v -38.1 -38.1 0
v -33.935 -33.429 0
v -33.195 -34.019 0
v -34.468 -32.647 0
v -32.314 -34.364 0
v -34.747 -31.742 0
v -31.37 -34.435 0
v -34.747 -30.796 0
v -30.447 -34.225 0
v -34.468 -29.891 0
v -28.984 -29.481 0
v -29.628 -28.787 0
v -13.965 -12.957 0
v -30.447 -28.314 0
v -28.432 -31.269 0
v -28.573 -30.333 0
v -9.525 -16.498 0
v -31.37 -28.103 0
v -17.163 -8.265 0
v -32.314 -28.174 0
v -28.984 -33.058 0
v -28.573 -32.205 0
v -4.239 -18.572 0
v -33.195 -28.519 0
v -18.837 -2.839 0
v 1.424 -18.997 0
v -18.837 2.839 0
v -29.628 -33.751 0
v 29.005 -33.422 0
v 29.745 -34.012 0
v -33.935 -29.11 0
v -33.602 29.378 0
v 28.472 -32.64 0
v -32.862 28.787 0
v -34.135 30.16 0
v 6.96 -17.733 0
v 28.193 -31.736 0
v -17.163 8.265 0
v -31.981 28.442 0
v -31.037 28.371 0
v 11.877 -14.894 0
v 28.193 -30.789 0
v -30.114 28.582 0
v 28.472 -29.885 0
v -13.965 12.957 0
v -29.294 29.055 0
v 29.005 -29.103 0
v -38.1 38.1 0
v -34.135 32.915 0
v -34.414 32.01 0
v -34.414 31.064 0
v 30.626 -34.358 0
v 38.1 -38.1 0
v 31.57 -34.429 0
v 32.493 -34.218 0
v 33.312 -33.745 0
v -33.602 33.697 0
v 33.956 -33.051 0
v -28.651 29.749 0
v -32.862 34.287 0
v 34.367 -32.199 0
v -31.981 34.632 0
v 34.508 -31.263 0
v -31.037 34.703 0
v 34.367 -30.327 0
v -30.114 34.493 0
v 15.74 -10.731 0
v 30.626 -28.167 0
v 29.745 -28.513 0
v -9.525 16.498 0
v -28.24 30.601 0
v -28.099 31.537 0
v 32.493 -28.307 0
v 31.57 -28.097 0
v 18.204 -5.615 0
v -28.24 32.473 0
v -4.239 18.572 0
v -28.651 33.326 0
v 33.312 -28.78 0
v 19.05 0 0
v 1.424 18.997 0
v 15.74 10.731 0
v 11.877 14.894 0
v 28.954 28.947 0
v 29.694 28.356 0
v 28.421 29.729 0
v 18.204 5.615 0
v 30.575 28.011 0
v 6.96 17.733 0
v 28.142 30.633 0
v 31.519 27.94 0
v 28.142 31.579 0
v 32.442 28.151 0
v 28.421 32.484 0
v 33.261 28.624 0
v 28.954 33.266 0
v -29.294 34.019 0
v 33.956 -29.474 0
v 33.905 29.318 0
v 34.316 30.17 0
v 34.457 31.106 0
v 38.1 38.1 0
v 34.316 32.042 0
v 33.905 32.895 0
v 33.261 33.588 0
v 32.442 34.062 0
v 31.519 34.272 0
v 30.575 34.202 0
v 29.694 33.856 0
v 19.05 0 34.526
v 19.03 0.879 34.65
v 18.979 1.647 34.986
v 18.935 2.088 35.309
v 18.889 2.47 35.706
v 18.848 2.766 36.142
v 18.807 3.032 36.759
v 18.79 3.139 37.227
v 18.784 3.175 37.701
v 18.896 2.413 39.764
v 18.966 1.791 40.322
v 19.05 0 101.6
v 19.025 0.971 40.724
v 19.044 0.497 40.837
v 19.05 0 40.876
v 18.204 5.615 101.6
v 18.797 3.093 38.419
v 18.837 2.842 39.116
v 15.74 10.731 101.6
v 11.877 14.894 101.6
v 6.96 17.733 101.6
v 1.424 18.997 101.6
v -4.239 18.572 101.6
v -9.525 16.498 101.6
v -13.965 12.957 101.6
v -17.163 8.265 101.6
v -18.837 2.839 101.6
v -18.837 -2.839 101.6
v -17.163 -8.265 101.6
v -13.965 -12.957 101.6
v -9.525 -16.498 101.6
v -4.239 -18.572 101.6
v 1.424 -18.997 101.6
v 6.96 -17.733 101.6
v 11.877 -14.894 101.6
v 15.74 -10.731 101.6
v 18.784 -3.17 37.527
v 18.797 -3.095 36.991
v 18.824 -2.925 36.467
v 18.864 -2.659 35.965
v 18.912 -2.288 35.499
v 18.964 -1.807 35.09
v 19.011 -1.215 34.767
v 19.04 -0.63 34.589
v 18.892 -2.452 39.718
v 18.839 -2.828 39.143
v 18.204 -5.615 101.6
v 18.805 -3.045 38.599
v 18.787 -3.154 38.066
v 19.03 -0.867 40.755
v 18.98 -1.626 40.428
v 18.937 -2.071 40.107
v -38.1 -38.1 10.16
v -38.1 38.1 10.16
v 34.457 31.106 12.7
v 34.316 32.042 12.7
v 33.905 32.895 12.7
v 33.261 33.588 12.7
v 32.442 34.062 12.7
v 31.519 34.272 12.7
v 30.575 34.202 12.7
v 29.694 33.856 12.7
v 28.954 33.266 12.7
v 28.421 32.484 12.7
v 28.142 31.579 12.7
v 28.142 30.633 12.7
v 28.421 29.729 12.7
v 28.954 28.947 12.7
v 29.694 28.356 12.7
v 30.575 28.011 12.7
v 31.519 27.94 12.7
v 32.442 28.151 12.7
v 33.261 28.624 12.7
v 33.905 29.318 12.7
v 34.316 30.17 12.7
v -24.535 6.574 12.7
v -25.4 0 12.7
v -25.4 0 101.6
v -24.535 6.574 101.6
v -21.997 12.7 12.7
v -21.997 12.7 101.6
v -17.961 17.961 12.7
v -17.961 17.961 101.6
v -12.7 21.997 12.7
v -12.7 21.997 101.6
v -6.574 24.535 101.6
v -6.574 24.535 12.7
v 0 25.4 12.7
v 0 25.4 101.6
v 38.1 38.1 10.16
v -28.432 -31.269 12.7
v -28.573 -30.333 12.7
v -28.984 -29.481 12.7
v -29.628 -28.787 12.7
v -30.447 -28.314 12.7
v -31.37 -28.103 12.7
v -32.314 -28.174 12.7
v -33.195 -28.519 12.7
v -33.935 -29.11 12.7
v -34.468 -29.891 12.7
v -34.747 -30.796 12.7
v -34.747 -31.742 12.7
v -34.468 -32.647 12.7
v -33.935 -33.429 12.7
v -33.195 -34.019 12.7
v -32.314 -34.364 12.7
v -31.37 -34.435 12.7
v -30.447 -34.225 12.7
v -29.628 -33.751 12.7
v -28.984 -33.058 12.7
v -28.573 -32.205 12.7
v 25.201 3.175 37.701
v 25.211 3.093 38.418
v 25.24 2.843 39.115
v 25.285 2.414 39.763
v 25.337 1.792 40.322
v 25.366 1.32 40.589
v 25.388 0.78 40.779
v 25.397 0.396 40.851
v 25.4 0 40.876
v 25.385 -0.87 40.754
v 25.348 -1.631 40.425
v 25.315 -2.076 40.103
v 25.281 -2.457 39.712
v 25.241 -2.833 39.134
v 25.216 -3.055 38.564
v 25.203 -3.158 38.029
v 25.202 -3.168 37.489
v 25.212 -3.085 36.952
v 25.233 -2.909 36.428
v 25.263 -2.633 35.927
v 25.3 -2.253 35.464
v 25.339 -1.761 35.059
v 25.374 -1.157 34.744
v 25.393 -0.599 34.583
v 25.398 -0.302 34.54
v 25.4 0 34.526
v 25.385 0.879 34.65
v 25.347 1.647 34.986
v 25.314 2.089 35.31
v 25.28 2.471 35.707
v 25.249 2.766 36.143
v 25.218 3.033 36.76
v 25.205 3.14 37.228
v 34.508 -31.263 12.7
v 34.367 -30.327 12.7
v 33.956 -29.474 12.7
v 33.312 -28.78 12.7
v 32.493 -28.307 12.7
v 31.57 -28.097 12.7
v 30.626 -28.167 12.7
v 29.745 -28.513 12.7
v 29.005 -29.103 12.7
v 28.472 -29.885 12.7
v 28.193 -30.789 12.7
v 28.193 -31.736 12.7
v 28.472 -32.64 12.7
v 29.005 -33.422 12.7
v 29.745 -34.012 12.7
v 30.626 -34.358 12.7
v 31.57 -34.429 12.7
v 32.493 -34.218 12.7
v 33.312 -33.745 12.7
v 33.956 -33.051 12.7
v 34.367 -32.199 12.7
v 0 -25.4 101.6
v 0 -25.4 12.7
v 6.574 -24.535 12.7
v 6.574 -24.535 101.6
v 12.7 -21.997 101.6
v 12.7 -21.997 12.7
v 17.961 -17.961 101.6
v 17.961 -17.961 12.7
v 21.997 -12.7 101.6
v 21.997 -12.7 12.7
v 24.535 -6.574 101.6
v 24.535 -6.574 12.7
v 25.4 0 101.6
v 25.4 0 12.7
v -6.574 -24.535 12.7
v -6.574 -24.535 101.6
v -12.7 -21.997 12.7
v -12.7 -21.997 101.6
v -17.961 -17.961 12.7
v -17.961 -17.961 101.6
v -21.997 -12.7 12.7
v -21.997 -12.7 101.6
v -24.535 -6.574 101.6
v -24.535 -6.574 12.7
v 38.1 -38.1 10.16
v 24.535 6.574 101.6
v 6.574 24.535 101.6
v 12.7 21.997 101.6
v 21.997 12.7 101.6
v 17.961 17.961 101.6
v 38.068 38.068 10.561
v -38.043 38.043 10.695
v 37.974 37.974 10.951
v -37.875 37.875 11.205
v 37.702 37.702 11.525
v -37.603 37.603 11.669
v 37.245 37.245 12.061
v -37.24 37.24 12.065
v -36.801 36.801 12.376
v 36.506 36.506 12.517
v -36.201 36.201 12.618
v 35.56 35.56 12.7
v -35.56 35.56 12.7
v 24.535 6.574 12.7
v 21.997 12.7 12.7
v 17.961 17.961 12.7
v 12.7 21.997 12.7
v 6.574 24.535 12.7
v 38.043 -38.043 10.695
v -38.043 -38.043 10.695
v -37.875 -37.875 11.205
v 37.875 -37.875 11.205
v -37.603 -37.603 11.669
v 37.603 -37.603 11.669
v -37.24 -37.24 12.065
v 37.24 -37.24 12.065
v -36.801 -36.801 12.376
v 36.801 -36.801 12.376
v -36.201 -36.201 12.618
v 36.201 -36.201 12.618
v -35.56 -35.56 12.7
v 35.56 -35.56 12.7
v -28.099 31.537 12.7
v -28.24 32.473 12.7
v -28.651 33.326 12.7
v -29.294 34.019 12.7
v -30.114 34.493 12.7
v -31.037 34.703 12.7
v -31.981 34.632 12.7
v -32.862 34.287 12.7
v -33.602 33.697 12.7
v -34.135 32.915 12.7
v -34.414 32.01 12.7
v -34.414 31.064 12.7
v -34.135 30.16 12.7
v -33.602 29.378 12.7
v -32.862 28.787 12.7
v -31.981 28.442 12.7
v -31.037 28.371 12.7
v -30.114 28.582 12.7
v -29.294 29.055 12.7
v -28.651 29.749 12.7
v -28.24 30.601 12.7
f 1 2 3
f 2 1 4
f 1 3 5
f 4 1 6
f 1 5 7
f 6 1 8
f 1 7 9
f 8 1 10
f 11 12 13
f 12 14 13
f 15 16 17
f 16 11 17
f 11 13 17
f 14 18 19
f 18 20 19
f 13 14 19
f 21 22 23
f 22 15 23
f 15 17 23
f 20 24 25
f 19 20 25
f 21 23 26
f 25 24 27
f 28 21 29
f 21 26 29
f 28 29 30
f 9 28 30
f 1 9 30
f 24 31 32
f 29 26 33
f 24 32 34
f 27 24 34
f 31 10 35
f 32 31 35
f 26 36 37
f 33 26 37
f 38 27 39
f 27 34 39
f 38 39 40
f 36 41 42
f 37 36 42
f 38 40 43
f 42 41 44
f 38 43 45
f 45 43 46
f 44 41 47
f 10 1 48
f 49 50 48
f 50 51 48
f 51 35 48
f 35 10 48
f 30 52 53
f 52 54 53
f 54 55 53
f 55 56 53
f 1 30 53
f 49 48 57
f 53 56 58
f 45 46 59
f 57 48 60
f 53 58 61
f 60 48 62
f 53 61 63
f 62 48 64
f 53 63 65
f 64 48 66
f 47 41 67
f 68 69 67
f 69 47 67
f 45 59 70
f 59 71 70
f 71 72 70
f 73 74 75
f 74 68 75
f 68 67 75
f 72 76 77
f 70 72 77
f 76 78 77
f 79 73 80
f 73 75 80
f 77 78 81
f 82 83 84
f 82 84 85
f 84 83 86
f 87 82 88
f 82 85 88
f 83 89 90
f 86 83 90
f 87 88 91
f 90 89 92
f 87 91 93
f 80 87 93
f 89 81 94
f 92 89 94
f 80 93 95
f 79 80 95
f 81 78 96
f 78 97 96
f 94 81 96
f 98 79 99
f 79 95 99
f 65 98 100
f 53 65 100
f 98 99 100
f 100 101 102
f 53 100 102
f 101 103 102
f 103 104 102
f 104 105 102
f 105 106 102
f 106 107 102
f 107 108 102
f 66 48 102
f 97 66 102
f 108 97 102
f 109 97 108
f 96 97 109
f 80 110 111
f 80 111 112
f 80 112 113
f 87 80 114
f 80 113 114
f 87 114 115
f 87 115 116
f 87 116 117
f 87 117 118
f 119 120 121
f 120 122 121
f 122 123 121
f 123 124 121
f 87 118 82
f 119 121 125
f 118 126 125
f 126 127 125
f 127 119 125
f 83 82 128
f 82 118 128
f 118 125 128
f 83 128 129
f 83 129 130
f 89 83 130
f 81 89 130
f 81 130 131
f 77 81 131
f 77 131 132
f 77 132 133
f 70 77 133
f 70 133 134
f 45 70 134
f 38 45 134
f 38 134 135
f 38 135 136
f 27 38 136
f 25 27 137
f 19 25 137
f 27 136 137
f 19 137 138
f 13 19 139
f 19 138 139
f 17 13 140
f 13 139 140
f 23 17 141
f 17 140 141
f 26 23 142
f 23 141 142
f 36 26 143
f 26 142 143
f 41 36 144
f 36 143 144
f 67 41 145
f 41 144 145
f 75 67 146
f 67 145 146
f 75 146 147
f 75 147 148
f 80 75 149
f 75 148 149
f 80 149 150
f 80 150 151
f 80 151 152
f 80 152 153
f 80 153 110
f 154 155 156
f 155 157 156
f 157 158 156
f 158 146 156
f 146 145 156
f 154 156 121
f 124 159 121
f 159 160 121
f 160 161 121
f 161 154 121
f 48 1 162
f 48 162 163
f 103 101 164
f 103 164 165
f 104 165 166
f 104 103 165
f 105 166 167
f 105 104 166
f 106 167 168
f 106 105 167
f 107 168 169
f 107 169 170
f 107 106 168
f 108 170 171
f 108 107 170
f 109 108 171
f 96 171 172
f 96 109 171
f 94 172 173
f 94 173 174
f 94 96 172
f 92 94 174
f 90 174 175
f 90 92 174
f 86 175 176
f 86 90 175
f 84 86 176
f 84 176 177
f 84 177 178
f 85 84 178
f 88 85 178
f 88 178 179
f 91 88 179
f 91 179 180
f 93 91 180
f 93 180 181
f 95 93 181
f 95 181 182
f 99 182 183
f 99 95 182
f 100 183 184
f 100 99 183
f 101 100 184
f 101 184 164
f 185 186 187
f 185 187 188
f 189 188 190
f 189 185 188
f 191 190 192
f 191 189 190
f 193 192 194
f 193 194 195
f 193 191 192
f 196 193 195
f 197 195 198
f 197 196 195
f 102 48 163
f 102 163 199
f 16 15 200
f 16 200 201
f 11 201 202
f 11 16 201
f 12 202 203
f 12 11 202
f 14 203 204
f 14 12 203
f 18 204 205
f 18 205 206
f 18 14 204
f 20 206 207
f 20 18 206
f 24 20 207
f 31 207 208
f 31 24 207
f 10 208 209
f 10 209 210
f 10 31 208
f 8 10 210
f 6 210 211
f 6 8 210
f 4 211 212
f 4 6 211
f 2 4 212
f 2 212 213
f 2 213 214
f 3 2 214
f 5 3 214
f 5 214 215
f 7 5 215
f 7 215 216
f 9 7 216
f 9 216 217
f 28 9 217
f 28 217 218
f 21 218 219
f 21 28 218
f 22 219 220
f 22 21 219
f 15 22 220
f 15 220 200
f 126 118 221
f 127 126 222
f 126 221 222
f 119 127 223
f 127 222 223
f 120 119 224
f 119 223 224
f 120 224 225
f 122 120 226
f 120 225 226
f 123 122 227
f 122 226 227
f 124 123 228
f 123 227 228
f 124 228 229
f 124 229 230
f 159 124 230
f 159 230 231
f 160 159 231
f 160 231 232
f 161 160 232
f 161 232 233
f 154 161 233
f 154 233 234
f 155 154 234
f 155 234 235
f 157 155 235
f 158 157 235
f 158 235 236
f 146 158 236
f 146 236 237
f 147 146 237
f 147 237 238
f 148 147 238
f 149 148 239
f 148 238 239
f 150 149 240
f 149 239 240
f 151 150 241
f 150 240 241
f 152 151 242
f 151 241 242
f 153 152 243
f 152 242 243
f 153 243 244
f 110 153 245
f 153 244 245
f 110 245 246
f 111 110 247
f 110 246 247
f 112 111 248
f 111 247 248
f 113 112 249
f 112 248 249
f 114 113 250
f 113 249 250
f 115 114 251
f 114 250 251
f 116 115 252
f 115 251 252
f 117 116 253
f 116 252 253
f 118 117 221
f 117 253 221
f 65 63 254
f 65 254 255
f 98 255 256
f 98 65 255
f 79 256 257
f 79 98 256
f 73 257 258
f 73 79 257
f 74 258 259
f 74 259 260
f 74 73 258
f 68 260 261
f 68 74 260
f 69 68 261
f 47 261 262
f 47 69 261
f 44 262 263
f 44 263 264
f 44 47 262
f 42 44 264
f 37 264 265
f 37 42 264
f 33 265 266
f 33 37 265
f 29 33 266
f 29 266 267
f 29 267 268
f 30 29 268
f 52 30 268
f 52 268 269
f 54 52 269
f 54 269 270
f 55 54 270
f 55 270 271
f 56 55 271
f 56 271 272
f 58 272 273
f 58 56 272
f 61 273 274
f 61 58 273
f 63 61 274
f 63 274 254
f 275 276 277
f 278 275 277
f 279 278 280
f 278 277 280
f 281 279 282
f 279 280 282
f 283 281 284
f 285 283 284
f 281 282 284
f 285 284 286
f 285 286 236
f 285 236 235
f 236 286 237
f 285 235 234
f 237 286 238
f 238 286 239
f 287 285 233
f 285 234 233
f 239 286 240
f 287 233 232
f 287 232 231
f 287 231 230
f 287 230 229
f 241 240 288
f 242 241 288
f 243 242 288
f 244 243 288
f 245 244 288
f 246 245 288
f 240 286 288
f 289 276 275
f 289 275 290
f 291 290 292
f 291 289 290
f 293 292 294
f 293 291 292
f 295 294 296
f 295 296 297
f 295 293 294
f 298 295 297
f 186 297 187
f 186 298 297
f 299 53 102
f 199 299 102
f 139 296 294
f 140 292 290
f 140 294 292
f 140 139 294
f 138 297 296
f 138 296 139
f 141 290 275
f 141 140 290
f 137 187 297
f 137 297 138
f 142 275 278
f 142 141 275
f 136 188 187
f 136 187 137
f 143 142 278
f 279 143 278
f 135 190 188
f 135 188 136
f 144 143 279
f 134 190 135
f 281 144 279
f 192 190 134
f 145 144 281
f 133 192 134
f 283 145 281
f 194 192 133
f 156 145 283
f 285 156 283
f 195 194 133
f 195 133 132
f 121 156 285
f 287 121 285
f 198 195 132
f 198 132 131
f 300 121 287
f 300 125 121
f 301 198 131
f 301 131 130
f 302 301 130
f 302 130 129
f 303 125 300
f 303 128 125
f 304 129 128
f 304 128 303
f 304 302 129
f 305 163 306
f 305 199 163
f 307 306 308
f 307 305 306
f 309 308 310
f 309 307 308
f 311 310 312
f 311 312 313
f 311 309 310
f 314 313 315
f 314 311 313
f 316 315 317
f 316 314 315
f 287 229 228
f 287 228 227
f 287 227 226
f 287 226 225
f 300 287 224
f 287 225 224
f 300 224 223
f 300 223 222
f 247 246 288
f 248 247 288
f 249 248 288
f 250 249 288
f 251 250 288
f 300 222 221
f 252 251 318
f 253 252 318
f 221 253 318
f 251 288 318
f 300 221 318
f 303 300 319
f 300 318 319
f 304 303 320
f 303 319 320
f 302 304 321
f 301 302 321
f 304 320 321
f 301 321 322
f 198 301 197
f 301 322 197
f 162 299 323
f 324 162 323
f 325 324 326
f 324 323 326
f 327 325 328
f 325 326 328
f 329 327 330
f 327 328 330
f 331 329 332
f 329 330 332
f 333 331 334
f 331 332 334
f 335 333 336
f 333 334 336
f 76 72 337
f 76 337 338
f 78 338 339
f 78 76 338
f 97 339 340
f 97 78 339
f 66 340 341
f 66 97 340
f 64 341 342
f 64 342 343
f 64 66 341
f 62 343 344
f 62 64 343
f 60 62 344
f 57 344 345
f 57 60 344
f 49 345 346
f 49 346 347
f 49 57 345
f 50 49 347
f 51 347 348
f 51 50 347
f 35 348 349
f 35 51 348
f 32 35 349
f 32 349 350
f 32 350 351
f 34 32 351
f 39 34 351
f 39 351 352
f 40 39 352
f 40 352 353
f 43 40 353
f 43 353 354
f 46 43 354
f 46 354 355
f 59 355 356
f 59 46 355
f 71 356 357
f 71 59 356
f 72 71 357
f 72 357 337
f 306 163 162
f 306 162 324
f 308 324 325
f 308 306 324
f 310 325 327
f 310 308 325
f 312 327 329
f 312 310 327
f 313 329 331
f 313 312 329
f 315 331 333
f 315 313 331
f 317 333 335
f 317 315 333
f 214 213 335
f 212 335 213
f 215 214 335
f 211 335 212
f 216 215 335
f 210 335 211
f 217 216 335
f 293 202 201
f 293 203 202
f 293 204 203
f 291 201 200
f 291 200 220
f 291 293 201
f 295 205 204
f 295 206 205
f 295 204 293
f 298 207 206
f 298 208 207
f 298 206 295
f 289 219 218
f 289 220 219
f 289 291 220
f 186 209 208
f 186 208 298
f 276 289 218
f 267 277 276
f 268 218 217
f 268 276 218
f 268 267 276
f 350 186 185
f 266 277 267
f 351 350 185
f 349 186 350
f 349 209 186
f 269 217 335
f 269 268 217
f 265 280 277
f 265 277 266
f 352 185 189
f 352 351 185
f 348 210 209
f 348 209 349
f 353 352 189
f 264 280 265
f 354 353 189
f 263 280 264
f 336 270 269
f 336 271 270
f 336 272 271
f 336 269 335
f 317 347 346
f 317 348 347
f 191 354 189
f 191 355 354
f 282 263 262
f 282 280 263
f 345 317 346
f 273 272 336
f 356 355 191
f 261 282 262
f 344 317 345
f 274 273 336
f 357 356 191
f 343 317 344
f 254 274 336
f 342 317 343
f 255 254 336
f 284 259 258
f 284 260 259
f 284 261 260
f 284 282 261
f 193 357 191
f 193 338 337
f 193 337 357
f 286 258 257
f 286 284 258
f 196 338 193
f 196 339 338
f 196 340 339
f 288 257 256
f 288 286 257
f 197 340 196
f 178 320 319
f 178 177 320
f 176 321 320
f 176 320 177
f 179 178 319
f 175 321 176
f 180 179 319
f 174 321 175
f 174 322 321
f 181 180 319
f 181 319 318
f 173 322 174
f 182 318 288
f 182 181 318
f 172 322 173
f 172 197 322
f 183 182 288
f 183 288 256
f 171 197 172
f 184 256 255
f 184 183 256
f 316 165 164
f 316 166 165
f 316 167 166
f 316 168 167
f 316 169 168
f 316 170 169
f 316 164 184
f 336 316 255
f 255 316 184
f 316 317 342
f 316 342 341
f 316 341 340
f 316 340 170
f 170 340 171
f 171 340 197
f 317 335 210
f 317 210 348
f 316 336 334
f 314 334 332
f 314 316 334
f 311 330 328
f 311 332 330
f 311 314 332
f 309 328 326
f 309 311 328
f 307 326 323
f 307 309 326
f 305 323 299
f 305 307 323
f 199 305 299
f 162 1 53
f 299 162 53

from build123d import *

# Parameters (mm, degrees)
F0_W        = 50.8
F0_H        = 50.8
F1_DEPTH    = 101.6
F0_W_2      = 76.2
F0_H_2      = 76.2
F0_R        = 3.175
F2_DEPTH    = 12.7
F3_R        = 19.05
F4_DEPTH    = 101.601
F5_R        = 3.175
F6_DEPTH    = 25.4
F7_T1_DEPTH = 88.9
F8_R        = 2.54


# Not quite as in the source:
# - a fillet or chamfer that OpenCascade refuses, or shapes differently, is made with other operations: its cross-section is extruded or revolved along the edge and cut away or added


with BuildPart() as f1:
    # F0 (on Top) → F1 (new body)
    with BuildSketch(Plane.XY):
        Rectangle(F0_W, F0_H)
    extrude(amount=F1_DEPTH)

    # F0 (on Top) → F2 (join)
    with BuildSketch(Plane.XY):
        Rectangle(F0_W_2, F0_H_2)
        with Locations((-31.6072627902, -31.269069761)):
            Circle(F0_R, mode=Mode.SUBTRACT)
        with Locations((31.3326152668, -31.2626581123)):
            Circle(F0_R, mode=Mode.SUBTRACT)
        Rectangle(F0_W, F0_H, mode=Mode.SUBTRACT)
        with Locations((-31.2740796408, 31.5370819021)):
            Circle(F0_R, mode=Mode.SUBTRACT)
        with Locations((31.2819033467, 31.1061042501)):
            Circle(F0_R, mode=Mode.SUBTRACT)
    extrude(amount=F2_DEPTH)

    # F3 (on face) → F4 (cut, through all)
    with BuildSketch(Plane.XY.offset(101.6)):
        Circle(F3_R)
    extrude(amount=-F4_DEPTH, mode=Mode.SUBTRACT)

    # F5 (on face) → F6 (cut)
    with BuildSketch(Plane.YZ.offset(25.4)):
        with Locations((0, 37.7008840442)):
            Circle(F5_R)
    extrude(amount=-F6_DEPTH, mode=Mode.SUBTRACT)

    # F7: fillet of radius 25.4 on 4 edges, made by hand

    # F7_s2 → F7_t1 (cut)
    with BuildSketch(Plane.XY.offset(12.7)):
        with BuildLine():
            ThreePointArc((0, -25.4), (17.9605122421, -17.9605122421), (25.4, 0))
            Line((25.4, 0), (25.908, 0))
            Line((25.908, 0), (25.908, -25.908))
            Line((25.908, -25.908), (0, -25.908))
            Line((0, -25.908), (0, -25.4))
        make_face()
        with BuildLine():
            ThreePointArc((25.4, 0), (17.9605122421, 17.9605122421), (0, 25.4))
            Line((0, 25.4), (0, 25.908))
            Line((0, 25.908), (25.908, 25.908))
            Line((25.908, 25.908), (25.908, 0))
            Line((25.908, 0), (25.4, 0))
        make_face()
        with BuildLine():
            ThreePointArc((0, -25.4), (-17.9605122421, -17.9605122421), (-25.4, 0))
            Line((-25.4, 0), (-25.908, 0))
            Line((-25.908, 0), (-25.908, -25.908))
            Line((-25.908, -25.908), (0, -25.908))
            Line((0, -25.908), (0, -25.4))
        make_face()
        with BuildLine():
            ThreePointArc((-25.4, 0), (-17.9605122421, 17.9605122421), (0, 25.4))
            Line((0, 25.4), (0, 25.908))
            Line((0, 25.908), (-25.908, 25.908))
            Line((-25.908, 25.908), (-25.908, 0))
            Line((-25.908, 0), (-25.4, 0))
        make_face()
    extrude(amount=F7_T1_DEPTH, mode=Mode.SUBTRACT)

    # F8
    f8_edges = [f1.edges().sort_by_distance(p)[0] for p in [
        (0, -38.1, 12.7),
        (38.1, 0, 12.7),
        (-38.1, 0, 12.7),
        (0, 38.1, 12.7),
    ]]
    fillet(f8_edges, radius=F8_R)


solid = f1.part
